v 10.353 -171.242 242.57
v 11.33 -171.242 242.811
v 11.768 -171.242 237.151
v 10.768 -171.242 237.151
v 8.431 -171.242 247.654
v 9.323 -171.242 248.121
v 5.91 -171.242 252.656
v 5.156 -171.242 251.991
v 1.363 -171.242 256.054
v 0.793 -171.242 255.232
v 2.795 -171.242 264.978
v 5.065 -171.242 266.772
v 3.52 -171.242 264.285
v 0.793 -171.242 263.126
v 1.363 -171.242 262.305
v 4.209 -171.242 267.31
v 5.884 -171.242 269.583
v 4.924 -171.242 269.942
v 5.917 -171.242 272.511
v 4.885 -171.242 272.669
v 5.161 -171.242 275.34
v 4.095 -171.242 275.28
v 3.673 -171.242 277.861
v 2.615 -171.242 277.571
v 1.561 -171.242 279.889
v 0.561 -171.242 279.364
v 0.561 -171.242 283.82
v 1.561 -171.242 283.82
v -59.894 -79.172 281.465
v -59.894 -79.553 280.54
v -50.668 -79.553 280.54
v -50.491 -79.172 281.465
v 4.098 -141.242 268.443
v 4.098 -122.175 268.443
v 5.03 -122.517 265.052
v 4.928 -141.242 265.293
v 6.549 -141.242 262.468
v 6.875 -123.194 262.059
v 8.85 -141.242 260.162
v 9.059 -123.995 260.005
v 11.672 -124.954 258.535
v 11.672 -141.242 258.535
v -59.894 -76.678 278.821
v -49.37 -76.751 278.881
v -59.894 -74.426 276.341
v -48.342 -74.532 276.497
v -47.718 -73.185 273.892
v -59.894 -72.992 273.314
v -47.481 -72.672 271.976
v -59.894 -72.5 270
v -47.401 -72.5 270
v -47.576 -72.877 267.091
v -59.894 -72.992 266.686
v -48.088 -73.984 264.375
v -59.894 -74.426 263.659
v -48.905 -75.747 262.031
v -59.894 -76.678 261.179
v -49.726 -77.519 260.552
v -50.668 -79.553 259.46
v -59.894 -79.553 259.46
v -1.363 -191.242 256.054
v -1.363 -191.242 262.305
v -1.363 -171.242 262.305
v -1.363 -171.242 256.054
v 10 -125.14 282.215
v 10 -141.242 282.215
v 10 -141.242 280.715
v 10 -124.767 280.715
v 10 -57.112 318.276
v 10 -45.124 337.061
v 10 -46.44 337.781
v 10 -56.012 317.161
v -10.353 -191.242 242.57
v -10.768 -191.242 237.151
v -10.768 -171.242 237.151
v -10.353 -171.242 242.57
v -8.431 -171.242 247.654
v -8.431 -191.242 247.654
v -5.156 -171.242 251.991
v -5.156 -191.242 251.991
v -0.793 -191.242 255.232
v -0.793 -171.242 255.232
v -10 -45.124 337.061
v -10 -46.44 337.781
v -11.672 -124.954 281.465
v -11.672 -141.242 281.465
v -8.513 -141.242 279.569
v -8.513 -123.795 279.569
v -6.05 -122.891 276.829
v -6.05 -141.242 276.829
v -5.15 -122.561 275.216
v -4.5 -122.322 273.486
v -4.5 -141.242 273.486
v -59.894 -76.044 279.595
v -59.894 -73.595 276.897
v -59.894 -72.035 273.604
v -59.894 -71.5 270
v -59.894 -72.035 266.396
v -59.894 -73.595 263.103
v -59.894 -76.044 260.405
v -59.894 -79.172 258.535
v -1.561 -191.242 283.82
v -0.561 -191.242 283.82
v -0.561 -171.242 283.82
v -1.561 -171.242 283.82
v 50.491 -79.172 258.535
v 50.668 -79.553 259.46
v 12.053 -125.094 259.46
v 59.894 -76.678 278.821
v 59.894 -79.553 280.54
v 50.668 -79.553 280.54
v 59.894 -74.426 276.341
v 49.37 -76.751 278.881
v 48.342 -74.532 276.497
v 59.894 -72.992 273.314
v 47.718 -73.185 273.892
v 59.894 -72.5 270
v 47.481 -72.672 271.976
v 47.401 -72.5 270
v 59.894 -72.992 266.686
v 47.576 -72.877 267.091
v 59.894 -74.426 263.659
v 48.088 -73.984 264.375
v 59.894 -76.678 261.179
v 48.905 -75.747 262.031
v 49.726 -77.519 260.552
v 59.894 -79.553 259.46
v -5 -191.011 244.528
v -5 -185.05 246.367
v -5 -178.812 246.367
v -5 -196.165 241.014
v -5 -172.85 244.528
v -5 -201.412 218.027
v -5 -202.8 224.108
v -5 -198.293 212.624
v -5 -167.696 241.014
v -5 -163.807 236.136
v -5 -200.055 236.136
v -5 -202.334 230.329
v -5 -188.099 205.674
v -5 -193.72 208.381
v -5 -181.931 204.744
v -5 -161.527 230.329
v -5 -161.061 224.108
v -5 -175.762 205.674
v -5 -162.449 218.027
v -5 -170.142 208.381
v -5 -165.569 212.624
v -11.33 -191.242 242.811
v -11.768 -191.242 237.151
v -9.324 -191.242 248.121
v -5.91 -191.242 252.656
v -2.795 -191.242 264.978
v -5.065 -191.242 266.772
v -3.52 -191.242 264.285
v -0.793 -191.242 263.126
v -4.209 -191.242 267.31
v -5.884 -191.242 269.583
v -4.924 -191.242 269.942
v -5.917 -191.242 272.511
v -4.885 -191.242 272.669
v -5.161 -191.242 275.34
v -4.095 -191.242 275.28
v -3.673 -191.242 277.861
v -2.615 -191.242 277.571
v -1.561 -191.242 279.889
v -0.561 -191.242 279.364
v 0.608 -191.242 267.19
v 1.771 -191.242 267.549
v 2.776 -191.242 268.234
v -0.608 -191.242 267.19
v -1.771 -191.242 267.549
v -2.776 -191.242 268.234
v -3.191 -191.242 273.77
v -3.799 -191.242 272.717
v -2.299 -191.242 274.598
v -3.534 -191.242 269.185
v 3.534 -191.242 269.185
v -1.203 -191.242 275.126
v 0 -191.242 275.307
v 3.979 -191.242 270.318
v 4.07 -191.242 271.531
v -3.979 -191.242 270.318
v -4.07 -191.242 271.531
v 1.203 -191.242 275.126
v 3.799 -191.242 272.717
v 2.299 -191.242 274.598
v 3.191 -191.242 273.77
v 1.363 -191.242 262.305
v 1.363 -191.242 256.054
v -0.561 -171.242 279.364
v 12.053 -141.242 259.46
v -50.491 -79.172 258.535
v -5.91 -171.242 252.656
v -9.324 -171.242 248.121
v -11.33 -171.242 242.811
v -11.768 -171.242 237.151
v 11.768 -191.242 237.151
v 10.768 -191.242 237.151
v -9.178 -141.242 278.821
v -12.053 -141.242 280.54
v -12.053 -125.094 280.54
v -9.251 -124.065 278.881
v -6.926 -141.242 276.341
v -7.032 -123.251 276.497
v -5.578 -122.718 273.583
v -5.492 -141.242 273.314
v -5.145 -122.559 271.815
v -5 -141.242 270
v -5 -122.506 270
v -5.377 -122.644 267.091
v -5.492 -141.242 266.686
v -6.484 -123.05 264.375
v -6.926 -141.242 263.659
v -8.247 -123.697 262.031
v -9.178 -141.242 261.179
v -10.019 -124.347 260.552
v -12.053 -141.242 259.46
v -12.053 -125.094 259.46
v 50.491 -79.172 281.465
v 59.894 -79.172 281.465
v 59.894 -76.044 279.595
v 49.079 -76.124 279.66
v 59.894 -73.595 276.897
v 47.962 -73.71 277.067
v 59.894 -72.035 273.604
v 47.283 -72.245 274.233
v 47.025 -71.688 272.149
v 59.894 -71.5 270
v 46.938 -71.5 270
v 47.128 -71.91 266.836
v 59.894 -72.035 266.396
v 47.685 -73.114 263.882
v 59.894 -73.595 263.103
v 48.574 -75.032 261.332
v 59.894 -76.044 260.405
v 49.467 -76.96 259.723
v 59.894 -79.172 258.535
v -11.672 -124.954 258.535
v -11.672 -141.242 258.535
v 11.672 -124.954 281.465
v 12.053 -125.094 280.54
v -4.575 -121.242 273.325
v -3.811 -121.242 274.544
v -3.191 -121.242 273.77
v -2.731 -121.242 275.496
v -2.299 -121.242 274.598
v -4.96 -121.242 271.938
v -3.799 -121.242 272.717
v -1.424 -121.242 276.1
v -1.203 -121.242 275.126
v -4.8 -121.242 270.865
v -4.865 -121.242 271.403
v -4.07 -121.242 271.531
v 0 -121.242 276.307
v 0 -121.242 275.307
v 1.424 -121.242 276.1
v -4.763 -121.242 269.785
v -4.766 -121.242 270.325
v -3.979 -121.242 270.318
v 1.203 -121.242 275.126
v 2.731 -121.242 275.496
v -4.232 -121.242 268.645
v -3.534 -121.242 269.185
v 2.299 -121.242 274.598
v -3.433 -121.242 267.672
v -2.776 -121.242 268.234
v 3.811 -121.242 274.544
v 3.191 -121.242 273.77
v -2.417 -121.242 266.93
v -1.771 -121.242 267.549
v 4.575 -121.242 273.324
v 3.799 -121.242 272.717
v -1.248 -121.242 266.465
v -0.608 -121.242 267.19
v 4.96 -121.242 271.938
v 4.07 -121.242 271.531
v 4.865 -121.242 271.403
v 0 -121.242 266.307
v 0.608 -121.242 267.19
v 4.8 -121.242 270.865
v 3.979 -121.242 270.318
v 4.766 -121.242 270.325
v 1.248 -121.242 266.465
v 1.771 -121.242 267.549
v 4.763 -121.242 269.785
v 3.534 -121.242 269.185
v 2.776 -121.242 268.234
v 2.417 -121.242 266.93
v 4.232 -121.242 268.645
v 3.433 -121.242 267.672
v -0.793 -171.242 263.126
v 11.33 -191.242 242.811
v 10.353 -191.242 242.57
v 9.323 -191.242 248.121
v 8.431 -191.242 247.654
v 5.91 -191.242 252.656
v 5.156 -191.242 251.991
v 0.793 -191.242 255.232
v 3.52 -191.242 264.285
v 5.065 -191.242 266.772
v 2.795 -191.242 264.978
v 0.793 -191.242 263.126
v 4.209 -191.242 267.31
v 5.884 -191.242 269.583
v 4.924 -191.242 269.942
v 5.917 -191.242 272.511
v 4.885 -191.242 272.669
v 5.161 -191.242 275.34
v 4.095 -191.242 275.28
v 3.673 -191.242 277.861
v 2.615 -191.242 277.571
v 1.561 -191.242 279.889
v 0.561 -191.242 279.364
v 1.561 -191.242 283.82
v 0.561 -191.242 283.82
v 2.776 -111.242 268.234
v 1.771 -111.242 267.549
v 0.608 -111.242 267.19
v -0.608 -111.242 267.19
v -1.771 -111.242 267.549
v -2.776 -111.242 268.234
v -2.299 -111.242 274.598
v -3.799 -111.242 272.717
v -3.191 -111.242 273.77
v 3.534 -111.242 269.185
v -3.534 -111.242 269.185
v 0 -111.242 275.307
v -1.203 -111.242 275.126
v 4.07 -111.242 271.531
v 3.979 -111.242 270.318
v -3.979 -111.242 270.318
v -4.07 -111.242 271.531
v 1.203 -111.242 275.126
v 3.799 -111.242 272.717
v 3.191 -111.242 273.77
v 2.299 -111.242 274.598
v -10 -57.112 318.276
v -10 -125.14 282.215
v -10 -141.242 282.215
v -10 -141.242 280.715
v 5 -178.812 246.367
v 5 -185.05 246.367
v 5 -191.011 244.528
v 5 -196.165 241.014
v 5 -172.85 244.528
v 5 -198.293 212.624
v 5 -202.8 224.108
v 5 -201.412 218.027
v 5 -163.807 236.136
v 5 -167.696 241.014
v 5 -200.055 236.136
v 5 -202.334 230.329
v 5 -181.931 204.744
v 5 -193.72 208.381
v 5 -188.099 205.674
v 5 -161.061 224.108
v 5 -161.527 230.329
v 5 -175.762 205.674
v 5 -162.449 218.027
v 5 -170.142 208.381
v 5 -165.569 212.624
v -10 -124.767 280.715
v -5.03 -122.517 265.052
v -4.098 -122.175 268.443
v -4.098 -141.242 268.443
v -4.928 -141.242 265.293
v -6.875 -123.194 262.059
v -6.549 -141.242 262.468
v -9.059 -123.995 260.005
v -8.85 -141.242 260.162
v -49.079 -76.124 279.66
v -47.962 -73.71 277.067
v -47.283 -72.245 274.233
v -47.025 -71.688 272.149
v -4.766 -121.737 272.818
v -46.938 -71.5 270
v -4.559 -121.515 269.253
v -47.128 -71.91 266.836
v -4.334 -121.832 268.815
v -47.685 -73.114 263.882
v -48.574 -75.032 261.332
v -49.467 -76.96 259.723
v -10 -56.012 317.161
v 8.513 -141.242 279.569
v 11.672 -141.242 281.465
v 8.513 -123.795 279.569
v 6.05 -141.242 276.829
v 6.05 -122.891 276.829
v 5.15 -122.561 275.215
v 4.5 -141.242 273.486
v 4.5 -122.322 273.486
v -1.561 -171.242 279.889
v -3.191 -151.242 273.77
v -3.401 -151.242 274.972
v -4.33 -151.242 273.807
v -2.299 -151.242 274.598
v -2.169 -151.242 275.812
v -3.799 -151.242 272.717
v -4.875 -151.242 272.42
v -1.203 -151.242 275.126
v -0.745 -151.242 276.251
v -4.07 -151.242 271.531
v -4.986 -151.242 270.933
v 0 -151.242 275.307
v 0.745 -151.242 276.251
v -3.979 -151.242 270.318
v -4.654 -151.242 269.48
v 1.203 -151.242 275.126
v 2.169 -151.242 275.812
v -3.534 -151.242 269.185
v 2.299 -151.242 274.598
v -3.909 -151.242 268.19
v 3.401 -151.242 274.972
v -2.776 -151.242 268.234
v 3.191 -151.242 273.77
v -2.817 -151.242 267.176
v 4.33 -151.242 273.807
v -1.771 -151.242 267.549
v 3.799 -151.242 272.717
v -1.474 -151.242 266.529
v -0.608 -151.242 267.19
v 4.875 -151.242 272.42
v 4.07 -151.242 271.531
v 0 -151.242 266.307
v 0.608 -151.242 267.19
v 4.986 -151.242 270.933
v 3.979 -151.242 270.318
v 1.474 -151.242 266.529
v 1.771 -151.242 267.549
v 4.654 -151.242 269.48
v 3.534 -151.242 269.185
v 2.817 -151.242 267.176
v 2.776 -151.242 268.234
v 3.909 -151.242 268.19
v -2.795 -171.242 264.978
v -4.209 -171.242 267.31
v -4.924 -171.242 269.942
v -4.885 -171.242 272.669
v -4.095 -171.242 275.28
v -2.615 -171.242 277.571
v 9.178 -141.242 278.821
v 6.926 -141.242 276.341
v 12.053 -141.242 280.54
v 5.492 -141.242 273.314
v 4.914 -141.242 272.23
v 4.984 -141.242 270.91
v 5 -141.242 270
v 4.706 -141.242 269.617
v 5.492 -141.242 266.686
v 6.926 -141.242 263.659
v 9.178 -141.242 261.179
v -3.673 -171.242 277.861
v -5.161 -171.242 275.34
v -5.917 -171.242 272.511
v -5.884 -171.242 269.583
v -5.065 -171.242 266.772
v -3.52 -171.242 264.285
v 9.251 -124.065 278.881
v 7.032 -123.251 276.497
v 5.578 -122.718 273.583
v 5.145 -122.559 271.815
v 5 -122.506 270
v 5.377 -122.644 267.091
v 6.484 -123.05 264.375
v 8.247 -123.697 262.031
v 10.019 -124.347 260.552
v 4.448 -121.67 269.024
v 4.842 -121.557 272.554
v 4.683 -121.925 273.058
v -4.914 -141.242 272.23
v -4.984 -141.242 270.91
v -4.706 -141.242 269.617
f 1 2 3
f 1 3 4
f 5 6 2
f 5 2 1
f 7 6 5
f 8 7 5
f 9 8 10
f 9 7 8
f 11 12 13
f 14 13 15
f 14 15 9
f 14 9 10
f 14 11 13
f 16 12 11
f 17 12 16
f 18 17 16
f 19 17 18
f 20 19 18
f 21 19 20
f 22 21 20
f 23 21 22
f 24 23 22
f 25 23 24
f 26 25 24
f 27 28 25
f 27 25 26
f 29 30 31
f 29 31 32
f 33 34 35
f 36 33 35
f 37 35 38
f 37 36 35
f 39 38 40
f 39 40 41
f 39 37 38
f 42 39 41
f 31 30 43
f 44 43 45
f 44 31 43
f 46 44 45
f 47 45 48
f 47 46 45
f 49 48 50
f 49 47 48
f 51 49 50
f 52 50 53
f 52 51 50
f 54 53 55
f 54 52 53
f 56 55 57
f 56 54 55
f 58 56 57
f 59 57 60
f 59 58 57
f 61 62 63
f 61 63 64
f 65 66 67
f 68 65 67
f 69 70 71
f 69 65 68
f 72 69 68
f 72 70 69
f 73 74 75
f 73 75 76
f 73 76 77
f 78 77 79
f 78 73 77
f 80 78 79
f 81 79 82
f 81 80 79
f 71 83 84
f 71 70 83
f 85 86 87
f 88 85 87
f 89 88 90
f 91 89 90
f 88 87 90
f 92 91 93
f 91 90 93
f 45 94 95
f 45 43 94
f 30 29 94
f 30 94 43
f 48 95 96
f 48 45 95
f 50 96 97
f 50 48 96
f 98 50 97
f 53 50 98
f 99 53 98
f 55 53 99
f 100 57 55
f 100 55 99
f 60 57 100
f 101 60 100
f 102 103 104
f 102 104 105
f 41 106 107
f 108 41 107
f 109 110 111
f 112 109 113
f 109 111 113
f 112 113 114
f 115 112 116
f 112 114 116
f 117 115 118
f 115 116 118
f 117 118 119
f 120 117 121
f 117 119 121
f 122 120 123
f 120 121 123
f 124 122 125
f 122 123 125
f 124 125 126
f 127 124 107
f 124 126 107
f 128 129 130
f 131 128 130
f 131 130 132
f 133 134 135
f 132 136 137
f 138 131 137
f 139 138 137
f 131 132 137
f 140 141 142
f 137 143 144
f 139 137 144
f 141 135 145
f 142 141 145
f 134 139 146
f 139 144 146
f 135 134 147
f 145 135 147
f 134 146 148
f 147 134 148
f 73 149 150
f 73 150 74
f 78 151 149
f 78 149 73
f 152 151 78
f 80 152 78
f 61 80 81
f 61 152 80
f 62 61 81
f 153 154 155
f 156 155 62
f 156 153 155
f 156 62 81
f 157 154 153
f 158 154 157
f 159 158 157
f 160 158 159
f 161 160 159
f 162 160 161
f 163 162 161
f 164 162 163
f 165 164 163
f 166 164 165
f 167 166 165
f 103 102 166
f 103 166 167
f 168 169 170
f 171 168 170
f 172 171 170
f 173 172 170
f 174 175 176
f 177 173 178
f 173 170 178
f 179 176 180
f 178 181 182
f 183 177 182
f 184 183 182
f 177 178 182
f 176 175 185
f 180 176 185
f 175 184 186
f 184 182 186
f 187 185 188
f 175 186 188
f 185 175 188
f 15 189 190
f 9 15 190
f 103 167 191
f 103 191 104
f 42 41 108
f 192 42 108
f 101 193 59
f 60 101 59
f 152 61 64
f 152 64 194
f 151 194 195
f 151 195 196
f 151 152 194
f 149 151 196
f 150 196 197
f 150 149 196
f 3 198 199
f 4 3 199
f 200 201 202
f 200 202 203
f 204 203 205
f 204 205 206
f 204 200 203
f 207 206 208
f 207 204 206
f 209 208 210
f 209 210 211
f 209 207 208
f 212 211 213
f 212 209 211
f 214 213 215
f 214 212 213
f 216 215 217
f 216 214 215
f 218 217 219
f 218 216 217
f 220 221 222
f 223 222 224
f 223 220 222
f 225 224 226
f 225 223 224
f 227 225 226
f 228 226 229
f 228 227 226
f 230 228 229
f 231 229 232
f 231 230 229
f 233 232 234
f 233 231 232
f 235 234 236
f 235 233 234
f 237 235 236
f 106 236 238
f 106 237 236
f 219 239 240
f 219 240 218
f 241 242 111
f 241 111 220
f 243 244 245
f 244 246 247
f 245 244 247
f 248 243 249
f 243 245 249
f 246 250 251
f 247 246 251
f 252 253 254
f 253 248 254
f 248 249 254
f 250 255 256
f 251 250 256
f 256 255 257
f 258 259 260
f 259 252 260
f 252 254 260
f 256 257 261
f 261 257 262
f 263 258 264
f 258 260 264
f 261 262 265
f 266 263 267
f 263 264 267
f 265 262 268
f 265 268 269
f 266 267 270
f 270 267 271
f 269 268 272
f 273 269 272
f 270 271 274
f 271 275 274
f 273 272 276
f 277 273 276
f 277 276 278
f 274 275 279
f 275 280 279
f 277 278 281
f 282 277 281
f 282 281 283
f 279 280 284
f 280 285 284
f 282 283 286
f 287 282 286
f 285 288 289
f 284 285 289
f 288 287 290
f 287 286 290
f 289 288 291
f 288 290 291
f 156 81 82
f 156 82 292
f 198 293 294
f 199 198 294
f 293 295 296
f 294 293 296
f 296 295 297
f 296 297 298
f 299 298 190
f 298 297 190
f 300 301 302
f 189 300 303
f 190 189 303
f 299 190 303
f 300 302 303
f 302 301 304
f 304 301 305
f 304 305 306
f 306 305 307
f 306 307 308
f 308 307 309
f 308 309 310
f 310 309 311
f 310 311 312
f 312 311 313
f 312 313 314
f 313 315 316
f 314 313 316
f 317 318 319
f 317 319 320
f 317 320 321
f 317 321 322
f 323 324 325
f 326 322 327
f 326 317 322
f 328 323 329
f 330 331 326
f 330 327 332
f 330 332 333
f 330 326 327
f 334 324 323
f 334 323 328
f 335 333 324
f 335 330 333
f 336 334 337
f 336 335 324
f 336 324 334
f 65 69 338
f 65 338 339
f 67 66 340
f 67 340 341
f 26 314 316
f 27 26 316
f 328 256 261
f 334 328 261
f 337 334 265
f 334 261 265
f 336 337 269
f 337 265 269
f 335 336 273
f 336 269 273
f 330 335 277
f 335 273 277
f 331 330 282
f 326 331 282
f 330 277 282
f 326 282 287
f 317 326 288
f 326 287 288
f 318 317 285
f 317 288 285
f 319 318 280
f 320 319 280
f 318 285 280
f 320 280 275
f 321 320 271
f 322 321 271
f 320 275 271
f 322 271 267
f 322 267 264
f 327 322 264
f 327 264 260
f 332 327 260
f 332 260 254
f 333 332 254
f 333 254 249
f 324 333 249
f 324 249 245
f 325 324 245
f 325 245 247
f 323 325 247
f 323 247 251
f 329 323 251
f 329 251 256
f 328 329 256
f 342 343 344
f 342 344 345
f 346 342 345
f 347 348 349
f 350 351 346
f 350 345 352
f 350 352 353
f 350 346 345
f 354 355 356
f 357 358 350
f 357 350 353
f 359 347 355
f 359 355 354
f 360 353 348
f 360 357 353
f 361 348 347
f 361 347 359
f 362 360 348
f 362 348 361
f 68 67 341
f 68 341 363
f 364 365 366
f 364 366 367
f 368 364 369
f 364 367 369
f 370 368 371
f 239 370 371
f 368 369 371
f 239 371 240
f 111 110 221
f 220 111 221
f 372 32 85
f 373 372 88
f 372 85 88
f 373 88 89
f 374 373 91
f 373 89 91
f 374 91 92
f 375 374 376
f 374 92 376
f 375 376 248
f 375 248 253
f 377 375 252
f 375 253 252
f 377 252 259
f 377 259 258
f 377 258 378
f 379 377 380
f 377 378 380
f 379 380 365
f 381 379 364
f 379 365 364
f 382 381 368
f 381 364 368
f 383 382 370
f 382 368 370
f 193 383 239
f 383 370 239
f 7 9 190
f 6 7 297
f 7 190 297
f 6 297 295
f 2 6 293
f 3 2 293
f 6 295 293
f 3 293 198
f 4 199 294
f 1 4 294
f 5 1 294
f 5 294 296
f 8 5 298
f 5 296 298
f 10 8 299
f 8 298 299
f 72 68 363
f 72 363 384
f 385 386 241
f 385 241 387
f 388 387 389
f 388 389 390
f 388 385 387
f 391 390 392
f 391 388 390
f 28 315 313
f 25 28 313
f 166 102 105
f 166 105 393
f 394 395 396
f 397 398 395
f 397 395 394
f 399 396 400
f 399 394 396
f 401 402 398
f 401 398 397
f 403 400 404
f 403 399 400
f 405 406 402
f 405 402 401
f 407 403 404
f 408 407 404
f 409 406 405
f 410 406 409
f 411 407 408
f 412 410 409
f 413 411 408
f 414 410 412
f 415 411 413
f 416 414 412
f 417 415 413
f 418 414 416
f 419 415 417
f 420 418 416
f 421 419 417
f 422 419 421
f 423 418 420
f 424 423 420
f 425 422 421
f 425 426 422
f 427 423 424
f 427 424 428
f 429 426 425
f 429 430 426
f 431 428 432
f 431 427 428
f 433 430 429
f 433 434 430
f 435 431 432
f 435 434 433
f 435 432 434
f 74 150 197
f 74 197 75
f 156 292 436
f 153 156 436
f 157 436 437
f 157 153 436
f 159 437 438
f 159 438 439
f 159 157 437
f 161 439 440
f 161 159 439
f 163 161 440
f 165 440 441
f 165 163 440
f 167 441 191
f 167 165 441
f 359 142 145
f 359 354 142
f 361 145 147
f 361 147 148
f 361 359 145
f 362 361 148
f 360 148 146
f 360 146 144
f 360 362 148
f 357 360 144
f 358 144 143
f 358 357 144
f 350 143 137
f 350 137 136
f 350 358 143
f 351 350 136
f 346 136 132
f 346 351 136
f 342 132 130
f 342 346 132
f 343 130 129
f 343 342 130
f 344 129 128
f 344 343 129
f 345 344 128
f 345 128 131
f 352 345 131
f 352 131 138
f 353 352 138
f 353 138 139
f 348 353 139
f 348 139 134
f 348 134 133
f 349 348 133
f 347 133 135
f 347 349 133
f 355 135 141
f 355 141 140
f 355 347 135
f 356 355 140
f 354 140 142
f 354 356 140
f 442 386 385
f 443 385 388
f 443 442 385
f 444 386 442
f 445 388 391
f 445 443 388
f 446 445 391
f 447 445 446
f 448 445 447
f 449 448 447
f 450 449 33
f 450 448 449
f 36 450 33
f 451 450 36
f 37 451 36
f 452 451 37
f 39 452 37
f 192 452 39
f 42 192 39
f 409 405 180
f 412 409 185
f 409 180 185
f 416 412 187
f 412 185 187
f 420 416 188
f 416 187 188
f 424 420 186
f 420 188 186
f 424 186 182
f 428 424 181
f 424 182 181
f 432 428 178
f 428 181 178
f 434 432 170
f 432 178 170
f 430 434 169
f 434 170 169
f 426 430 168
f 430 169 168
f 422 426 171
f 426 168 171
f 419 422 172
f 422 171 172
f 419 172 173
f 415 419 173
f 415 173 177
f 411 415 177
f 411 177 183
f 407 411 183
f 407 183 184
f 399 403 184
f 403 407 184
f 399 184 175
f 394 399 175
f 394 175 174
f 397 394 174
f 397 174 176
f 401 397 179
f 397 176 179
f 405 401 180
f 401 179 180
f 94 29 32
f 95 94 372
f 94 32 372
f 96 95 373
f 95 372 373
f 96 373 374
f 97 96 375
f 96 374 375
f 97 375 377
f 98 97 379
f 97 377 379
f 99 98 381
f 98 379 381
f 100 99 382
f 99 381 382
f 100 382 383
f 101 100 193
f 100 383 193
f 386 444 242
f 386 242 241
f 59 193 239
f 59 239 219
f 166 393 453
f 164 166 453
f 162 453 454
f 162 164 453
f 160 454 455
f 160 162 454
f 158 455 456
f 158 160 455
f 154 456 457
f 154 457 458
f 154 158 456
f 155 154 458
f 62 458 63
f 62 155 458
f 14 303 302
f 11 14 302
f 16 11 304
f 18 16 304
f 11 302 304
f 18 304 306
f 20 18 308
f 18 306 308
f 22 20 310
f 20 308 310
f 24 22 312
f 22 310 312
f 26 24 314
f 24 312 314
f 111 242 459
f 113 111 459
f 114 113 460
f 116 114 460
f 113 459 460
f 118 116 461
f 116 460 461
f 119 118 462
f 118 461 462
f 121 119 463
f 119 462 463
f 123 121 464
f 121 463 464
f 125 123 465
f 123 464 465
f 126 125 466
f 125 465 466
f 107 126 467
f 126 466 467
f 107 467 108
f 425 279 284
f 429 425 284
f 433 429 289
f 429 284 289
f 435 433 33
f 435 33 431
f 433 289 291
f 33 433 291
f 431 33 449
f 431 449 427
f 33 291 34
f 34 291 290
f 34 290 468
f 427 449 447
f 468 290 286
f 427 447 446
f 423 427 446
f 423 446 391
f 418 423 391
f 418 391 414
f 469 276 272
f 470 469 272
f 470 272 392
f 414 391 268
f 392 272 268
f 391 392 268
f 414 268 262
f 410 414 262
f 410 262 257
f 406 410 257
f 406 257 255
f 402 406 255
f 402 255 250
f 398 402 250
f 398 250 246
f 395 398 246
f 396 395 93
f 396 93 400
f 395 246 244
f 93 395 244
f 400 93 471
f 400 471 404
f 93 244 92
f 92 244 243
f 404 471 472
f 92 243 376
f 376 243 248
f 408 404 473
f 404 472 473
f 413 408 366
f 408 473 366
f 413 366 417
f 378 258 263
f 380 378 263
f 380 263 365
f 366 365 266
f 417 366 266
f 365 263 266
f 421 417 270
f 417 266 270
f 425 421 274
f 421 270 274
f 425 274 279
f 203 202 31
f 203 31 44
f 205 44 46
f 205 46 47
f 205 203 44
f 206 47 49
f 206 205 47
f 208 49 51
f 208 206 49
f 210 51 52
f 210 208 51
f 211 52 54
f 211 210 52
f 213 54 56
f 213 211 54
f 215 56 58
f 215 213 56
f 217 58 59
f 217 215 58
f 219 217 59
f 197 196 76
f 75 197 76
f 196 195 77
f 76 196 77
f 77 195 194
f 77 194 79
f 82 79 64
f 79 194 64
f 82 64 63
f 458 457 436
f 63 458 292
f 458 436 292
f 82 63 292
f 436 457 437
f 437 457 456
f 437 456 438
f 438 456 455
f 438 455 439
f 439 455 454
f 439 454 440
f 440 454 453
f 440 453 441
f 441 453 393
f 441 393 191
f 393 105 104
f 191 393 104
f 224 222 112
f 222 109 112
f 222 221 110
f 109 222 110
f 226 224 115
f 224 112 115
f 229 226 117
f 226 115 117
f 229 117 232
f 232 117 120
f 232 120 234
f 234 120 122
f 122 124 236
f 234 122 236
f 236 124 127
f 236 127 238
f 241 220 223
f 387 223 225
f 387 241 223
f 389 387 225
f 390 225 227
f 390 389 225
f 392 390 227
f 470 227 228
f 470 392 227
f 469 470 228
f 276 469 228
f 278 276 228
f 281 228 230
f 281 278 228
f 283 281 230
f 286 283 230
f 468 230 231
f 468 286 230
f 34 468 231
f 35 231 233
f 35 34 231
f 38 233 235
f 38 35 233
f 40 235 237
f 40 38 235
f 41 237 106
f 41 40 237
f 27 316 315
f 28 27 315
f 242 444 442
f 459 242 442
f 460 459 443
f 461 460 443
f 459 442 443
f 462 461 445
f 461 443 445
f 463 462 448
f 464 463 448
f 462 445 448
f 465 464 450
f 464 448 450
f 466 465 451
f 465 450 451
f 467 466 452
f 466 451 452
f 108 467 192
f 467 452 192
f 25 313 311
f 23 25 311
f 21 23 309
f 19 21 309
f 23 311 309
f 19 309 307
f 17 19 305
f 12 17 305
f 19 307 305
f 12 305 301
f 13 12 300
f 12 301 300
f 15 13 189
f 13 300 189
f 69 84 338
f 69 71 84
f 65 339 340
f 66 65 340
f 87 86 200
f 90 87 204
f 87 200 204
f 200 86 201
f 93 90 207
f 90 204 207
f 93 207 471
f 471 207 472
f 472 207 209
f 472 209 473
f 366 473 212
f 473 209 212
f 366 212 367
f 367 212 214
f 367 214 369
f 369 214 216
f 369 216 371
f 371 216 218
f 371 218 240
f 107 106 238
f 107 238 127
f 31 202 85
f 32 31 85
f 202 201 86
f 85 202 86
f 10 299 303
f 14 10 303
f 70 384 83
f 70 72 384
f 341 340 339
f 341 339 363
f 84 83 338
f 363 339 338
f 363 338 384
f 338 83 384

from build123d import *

# Parameters (mm, degrees)
EXTRUDE_THIN1_DEPTH      = 10
BOSS_EXTRUDE1_DEPTH      = 10
BOSS_EXTRUDE1_DEPTH_BACK = 20
SKETCH4_R                = 5
SKETCH4_R_2              = 4
BOSS_EXTRUDE2_DEPTH      = 10
BOSS_EXTRUDE2_DEPTH_BACK = 70
SKETCH5_R                = 4.081222788
BOSS_EXTRUDE3_DEPTH      = 20
BOSS_EXTRUDE3_2_DEPTH    = 20
SKETCH7_R                = 20.9280517
BOSS_EXTRUDE4_DEPTH      = 5


with BuildPart() as part:
    # Sweep1: sweep along a path in Sketch1
    with BuildLine(Plane(origin=(0, 0, 270), x_dir=(-1, 0, 0), z_dir=(0, 0, -1))) as sweep1_path:
        Line((-59.894009261, -72.5), (-47.400965294, -72.5))
        Line((-47.400965294, -72.5), (-5, -122.505789754))
        Line((-5, -122.505789754), (-5, -141.242131714))
    # Sketch2 → Sweep1 (sweep)
    with BuildSketch(Plane(origin=(59.894009261, -72.5, 270), x_dir=(0, 0, 1), z_dir=(-1, 0, 0))):
        with BuildLine():
            Line((-11.464548439, -6.671945539), (-10.540135636, -7.053338995))
            ThreePointArc((-10.540135636, -7.053338995), (0, 0), (10.540135636, -7.053338995))
            Line((10.540135636, -7.053338995), (11.464548439, -6.671945539))
            ThreePointArc((11.464548439, -6.671945539), (0, 1), (-11.464548439, -6.671945539))
        make_face()
    sweep1 = sweep(path=sweep1_path.line, transition=Transition.RIGHT)

    # Sketch4 → Boss-Extrude1 (add, two sides: drawn at the far end of the back side and taken through both)
    with BuildSketch(Plane.XZ.offset(141.242131714).offset(-BOSS_EXTRUDE1_DEPTH_BACK)):
        with Locations(Location((-2.881e-05, 271.307070621, 0), (0, 0, 270))):
            Circle(SKETCH4_R)
        with Locations(Location((-2.881e-05, 271.307070621, 0), (0, 0, 270))):
            Circle(SKETCH4_R_2, mode=Mode.SUBTRACT)
    extrude(amount=BOSS_EXTRUDE1_DEPTH + BOSS_EXTRUDE1_DEPTH_BACK)

    # Mirror1: Sweep1 across plane
    add(sweep1.mirror(Plane(origin=(0, 0, 0), x_dir=(0, 0, 1), z_dir=(1, 0, 0))))

    # Sketch5 → Boss-Extrude2 (add, two sides: drawn at the far end of the back side and taken through both)
    with BuildSketch(Plane(origin=(0, -121.242131714, 0), x_dir=(1, 0, 0), z_dir=(0, 1, 0)).offset(-BOSS_EXTRUDE2_DEPTH_BACK)):
        with Locations(Location((-2.881e-05, -271.225847833, 0), (0, 0, 270))):
            Circle(SKETCH5_R)
    extrude(amount=BOSS_EXTRUDE2_DEPTH + BOSS_EXTRUDE2_DEPTH_BACK)


with BuildPart() as body_2:
    # Sketch3 → Extrude-Thin1 (new, symmetric)
    with BuildSketch(Plane(origin=(0, 0, 0), x_dir=(0, 0, -1), z_dir=(1, 0, 0))):
        Polygon((-337.780615928, -46.440133469), (-318.276012784, -57.111844821), (-282.214548439, -125.14016423), (-282.214548439, -141.242131714), (-280.714548439, -141.242131714), (-280.714548439, -124.767175443), (-317.161393078, -56.011853562), (-337.060630928, -45.12422253), align=None)
    extrude(amount=EXTRUDE_THIN1_DEPTH, both=True)


with BuildPart() as body_3:
    # Sketch6 → Boss-Extrude3 (new body)
    with BuildSketch(Plane.XZ.offset(191.242131714)):
        with BuildLine():
            Line((-1.362886831, 262.304783722), (-1.362886831, 256.053891241))
            ThreePointArc((-1.362886831, 256.053891241), (-9.323537391, 248.120757478), (-11.768040707, 237.151209985))
            Line((-11.768040707, 237.151209985), (-10.768040707, 237.151209985))
            ThreePointArc((-10.768040707, 237.151209985), (-8.43097798, 247.653990229), (-0.792892656, 255.232242508))
            Line((-0.792892656, 255.232242508), (-0.792892656, 263.126432455))
            ThreePointArc((-0.792892656, 263.126432455), (-5.00002881, 271.307070621), (-0.560911528, 279.364183825))
            Line((-0.560911528, 279.364183825), (-0.560911528, 283.819636353))
            Line((-0.560911528, 283.819636353), (-1.560911528, 283.819636353))
            Line((-1.560911528, 283.819636353), (-1.560911528, 279.889060629))
            ThreePointArc((-1.560911528, 279.889060629), (-6.000343473, 271.045812649), (-1.362886831, 262.304783722))
        make_face()
    extrude(amount=-BOSS_EXTRUDE3_DEPTH)


with BuildPart() as body_4:
    # Sketch6 → Boss-Extrude3 2 (new body)
    with BuildSketch(Plane.XZ.offset(191.242131714)):
        with BuildLine():
            ThreePointArc((1.362829212, 256.053891241), (9.323479772, 248.120757478), (11.767983088, 237.151209985))
            Line((11.767983088, 237.151209985), (10.767983088, 237.151209985))
            ThreePointArc((10.767983088, 237.151209985), (8.430920361, 247.653990229), (0.792835037, 255.232242508))
            Line((0.792835037, 255.232242508), (0.792835037, 263.126432455))
            ThreePointArc((0.792835037, 263.126432455), (4.99997119, 271.307070621), (0.560853909, 279.364183825))
            Line((0.560853909, 279.364183825), (0.560853909, 283.819636353))
            Line((0.560853909, 283.819636353), (1.560853909, 283.819636353))
            Line((1.560853909, 283.819636353), (1.560853909, 279.889060629))
            ThreePointArc((1.560853909, 279.889060629), (6.000285854, 271.045812649), (1.362829212, 262.304783722))
            Line((1.362829212, 262.304783722), (1.362829212, 256.053891241))
        make_face()
    extrude(amount=-BOSS_EXTRUDE3_2_DEPTH)


with BuildPart() as body_5:
    # Sketch7 → Boss-Extrude4 (new, symmetric)
    with BuildSketch(Plane(origin=(0, 0, 0), x_dir=(0, 0, -1), z_dir=(1, 0, 0))):
        with Locations((-225.672454033, -181.930793774)):
            Circle(SKETCH7_R)
    extrude(amount=BOSS_EXTRUDE4_DEPTH, both=True)


solid = Compound([part.part, body_2.part, body_3.part, body_4.part, body_5.part])
